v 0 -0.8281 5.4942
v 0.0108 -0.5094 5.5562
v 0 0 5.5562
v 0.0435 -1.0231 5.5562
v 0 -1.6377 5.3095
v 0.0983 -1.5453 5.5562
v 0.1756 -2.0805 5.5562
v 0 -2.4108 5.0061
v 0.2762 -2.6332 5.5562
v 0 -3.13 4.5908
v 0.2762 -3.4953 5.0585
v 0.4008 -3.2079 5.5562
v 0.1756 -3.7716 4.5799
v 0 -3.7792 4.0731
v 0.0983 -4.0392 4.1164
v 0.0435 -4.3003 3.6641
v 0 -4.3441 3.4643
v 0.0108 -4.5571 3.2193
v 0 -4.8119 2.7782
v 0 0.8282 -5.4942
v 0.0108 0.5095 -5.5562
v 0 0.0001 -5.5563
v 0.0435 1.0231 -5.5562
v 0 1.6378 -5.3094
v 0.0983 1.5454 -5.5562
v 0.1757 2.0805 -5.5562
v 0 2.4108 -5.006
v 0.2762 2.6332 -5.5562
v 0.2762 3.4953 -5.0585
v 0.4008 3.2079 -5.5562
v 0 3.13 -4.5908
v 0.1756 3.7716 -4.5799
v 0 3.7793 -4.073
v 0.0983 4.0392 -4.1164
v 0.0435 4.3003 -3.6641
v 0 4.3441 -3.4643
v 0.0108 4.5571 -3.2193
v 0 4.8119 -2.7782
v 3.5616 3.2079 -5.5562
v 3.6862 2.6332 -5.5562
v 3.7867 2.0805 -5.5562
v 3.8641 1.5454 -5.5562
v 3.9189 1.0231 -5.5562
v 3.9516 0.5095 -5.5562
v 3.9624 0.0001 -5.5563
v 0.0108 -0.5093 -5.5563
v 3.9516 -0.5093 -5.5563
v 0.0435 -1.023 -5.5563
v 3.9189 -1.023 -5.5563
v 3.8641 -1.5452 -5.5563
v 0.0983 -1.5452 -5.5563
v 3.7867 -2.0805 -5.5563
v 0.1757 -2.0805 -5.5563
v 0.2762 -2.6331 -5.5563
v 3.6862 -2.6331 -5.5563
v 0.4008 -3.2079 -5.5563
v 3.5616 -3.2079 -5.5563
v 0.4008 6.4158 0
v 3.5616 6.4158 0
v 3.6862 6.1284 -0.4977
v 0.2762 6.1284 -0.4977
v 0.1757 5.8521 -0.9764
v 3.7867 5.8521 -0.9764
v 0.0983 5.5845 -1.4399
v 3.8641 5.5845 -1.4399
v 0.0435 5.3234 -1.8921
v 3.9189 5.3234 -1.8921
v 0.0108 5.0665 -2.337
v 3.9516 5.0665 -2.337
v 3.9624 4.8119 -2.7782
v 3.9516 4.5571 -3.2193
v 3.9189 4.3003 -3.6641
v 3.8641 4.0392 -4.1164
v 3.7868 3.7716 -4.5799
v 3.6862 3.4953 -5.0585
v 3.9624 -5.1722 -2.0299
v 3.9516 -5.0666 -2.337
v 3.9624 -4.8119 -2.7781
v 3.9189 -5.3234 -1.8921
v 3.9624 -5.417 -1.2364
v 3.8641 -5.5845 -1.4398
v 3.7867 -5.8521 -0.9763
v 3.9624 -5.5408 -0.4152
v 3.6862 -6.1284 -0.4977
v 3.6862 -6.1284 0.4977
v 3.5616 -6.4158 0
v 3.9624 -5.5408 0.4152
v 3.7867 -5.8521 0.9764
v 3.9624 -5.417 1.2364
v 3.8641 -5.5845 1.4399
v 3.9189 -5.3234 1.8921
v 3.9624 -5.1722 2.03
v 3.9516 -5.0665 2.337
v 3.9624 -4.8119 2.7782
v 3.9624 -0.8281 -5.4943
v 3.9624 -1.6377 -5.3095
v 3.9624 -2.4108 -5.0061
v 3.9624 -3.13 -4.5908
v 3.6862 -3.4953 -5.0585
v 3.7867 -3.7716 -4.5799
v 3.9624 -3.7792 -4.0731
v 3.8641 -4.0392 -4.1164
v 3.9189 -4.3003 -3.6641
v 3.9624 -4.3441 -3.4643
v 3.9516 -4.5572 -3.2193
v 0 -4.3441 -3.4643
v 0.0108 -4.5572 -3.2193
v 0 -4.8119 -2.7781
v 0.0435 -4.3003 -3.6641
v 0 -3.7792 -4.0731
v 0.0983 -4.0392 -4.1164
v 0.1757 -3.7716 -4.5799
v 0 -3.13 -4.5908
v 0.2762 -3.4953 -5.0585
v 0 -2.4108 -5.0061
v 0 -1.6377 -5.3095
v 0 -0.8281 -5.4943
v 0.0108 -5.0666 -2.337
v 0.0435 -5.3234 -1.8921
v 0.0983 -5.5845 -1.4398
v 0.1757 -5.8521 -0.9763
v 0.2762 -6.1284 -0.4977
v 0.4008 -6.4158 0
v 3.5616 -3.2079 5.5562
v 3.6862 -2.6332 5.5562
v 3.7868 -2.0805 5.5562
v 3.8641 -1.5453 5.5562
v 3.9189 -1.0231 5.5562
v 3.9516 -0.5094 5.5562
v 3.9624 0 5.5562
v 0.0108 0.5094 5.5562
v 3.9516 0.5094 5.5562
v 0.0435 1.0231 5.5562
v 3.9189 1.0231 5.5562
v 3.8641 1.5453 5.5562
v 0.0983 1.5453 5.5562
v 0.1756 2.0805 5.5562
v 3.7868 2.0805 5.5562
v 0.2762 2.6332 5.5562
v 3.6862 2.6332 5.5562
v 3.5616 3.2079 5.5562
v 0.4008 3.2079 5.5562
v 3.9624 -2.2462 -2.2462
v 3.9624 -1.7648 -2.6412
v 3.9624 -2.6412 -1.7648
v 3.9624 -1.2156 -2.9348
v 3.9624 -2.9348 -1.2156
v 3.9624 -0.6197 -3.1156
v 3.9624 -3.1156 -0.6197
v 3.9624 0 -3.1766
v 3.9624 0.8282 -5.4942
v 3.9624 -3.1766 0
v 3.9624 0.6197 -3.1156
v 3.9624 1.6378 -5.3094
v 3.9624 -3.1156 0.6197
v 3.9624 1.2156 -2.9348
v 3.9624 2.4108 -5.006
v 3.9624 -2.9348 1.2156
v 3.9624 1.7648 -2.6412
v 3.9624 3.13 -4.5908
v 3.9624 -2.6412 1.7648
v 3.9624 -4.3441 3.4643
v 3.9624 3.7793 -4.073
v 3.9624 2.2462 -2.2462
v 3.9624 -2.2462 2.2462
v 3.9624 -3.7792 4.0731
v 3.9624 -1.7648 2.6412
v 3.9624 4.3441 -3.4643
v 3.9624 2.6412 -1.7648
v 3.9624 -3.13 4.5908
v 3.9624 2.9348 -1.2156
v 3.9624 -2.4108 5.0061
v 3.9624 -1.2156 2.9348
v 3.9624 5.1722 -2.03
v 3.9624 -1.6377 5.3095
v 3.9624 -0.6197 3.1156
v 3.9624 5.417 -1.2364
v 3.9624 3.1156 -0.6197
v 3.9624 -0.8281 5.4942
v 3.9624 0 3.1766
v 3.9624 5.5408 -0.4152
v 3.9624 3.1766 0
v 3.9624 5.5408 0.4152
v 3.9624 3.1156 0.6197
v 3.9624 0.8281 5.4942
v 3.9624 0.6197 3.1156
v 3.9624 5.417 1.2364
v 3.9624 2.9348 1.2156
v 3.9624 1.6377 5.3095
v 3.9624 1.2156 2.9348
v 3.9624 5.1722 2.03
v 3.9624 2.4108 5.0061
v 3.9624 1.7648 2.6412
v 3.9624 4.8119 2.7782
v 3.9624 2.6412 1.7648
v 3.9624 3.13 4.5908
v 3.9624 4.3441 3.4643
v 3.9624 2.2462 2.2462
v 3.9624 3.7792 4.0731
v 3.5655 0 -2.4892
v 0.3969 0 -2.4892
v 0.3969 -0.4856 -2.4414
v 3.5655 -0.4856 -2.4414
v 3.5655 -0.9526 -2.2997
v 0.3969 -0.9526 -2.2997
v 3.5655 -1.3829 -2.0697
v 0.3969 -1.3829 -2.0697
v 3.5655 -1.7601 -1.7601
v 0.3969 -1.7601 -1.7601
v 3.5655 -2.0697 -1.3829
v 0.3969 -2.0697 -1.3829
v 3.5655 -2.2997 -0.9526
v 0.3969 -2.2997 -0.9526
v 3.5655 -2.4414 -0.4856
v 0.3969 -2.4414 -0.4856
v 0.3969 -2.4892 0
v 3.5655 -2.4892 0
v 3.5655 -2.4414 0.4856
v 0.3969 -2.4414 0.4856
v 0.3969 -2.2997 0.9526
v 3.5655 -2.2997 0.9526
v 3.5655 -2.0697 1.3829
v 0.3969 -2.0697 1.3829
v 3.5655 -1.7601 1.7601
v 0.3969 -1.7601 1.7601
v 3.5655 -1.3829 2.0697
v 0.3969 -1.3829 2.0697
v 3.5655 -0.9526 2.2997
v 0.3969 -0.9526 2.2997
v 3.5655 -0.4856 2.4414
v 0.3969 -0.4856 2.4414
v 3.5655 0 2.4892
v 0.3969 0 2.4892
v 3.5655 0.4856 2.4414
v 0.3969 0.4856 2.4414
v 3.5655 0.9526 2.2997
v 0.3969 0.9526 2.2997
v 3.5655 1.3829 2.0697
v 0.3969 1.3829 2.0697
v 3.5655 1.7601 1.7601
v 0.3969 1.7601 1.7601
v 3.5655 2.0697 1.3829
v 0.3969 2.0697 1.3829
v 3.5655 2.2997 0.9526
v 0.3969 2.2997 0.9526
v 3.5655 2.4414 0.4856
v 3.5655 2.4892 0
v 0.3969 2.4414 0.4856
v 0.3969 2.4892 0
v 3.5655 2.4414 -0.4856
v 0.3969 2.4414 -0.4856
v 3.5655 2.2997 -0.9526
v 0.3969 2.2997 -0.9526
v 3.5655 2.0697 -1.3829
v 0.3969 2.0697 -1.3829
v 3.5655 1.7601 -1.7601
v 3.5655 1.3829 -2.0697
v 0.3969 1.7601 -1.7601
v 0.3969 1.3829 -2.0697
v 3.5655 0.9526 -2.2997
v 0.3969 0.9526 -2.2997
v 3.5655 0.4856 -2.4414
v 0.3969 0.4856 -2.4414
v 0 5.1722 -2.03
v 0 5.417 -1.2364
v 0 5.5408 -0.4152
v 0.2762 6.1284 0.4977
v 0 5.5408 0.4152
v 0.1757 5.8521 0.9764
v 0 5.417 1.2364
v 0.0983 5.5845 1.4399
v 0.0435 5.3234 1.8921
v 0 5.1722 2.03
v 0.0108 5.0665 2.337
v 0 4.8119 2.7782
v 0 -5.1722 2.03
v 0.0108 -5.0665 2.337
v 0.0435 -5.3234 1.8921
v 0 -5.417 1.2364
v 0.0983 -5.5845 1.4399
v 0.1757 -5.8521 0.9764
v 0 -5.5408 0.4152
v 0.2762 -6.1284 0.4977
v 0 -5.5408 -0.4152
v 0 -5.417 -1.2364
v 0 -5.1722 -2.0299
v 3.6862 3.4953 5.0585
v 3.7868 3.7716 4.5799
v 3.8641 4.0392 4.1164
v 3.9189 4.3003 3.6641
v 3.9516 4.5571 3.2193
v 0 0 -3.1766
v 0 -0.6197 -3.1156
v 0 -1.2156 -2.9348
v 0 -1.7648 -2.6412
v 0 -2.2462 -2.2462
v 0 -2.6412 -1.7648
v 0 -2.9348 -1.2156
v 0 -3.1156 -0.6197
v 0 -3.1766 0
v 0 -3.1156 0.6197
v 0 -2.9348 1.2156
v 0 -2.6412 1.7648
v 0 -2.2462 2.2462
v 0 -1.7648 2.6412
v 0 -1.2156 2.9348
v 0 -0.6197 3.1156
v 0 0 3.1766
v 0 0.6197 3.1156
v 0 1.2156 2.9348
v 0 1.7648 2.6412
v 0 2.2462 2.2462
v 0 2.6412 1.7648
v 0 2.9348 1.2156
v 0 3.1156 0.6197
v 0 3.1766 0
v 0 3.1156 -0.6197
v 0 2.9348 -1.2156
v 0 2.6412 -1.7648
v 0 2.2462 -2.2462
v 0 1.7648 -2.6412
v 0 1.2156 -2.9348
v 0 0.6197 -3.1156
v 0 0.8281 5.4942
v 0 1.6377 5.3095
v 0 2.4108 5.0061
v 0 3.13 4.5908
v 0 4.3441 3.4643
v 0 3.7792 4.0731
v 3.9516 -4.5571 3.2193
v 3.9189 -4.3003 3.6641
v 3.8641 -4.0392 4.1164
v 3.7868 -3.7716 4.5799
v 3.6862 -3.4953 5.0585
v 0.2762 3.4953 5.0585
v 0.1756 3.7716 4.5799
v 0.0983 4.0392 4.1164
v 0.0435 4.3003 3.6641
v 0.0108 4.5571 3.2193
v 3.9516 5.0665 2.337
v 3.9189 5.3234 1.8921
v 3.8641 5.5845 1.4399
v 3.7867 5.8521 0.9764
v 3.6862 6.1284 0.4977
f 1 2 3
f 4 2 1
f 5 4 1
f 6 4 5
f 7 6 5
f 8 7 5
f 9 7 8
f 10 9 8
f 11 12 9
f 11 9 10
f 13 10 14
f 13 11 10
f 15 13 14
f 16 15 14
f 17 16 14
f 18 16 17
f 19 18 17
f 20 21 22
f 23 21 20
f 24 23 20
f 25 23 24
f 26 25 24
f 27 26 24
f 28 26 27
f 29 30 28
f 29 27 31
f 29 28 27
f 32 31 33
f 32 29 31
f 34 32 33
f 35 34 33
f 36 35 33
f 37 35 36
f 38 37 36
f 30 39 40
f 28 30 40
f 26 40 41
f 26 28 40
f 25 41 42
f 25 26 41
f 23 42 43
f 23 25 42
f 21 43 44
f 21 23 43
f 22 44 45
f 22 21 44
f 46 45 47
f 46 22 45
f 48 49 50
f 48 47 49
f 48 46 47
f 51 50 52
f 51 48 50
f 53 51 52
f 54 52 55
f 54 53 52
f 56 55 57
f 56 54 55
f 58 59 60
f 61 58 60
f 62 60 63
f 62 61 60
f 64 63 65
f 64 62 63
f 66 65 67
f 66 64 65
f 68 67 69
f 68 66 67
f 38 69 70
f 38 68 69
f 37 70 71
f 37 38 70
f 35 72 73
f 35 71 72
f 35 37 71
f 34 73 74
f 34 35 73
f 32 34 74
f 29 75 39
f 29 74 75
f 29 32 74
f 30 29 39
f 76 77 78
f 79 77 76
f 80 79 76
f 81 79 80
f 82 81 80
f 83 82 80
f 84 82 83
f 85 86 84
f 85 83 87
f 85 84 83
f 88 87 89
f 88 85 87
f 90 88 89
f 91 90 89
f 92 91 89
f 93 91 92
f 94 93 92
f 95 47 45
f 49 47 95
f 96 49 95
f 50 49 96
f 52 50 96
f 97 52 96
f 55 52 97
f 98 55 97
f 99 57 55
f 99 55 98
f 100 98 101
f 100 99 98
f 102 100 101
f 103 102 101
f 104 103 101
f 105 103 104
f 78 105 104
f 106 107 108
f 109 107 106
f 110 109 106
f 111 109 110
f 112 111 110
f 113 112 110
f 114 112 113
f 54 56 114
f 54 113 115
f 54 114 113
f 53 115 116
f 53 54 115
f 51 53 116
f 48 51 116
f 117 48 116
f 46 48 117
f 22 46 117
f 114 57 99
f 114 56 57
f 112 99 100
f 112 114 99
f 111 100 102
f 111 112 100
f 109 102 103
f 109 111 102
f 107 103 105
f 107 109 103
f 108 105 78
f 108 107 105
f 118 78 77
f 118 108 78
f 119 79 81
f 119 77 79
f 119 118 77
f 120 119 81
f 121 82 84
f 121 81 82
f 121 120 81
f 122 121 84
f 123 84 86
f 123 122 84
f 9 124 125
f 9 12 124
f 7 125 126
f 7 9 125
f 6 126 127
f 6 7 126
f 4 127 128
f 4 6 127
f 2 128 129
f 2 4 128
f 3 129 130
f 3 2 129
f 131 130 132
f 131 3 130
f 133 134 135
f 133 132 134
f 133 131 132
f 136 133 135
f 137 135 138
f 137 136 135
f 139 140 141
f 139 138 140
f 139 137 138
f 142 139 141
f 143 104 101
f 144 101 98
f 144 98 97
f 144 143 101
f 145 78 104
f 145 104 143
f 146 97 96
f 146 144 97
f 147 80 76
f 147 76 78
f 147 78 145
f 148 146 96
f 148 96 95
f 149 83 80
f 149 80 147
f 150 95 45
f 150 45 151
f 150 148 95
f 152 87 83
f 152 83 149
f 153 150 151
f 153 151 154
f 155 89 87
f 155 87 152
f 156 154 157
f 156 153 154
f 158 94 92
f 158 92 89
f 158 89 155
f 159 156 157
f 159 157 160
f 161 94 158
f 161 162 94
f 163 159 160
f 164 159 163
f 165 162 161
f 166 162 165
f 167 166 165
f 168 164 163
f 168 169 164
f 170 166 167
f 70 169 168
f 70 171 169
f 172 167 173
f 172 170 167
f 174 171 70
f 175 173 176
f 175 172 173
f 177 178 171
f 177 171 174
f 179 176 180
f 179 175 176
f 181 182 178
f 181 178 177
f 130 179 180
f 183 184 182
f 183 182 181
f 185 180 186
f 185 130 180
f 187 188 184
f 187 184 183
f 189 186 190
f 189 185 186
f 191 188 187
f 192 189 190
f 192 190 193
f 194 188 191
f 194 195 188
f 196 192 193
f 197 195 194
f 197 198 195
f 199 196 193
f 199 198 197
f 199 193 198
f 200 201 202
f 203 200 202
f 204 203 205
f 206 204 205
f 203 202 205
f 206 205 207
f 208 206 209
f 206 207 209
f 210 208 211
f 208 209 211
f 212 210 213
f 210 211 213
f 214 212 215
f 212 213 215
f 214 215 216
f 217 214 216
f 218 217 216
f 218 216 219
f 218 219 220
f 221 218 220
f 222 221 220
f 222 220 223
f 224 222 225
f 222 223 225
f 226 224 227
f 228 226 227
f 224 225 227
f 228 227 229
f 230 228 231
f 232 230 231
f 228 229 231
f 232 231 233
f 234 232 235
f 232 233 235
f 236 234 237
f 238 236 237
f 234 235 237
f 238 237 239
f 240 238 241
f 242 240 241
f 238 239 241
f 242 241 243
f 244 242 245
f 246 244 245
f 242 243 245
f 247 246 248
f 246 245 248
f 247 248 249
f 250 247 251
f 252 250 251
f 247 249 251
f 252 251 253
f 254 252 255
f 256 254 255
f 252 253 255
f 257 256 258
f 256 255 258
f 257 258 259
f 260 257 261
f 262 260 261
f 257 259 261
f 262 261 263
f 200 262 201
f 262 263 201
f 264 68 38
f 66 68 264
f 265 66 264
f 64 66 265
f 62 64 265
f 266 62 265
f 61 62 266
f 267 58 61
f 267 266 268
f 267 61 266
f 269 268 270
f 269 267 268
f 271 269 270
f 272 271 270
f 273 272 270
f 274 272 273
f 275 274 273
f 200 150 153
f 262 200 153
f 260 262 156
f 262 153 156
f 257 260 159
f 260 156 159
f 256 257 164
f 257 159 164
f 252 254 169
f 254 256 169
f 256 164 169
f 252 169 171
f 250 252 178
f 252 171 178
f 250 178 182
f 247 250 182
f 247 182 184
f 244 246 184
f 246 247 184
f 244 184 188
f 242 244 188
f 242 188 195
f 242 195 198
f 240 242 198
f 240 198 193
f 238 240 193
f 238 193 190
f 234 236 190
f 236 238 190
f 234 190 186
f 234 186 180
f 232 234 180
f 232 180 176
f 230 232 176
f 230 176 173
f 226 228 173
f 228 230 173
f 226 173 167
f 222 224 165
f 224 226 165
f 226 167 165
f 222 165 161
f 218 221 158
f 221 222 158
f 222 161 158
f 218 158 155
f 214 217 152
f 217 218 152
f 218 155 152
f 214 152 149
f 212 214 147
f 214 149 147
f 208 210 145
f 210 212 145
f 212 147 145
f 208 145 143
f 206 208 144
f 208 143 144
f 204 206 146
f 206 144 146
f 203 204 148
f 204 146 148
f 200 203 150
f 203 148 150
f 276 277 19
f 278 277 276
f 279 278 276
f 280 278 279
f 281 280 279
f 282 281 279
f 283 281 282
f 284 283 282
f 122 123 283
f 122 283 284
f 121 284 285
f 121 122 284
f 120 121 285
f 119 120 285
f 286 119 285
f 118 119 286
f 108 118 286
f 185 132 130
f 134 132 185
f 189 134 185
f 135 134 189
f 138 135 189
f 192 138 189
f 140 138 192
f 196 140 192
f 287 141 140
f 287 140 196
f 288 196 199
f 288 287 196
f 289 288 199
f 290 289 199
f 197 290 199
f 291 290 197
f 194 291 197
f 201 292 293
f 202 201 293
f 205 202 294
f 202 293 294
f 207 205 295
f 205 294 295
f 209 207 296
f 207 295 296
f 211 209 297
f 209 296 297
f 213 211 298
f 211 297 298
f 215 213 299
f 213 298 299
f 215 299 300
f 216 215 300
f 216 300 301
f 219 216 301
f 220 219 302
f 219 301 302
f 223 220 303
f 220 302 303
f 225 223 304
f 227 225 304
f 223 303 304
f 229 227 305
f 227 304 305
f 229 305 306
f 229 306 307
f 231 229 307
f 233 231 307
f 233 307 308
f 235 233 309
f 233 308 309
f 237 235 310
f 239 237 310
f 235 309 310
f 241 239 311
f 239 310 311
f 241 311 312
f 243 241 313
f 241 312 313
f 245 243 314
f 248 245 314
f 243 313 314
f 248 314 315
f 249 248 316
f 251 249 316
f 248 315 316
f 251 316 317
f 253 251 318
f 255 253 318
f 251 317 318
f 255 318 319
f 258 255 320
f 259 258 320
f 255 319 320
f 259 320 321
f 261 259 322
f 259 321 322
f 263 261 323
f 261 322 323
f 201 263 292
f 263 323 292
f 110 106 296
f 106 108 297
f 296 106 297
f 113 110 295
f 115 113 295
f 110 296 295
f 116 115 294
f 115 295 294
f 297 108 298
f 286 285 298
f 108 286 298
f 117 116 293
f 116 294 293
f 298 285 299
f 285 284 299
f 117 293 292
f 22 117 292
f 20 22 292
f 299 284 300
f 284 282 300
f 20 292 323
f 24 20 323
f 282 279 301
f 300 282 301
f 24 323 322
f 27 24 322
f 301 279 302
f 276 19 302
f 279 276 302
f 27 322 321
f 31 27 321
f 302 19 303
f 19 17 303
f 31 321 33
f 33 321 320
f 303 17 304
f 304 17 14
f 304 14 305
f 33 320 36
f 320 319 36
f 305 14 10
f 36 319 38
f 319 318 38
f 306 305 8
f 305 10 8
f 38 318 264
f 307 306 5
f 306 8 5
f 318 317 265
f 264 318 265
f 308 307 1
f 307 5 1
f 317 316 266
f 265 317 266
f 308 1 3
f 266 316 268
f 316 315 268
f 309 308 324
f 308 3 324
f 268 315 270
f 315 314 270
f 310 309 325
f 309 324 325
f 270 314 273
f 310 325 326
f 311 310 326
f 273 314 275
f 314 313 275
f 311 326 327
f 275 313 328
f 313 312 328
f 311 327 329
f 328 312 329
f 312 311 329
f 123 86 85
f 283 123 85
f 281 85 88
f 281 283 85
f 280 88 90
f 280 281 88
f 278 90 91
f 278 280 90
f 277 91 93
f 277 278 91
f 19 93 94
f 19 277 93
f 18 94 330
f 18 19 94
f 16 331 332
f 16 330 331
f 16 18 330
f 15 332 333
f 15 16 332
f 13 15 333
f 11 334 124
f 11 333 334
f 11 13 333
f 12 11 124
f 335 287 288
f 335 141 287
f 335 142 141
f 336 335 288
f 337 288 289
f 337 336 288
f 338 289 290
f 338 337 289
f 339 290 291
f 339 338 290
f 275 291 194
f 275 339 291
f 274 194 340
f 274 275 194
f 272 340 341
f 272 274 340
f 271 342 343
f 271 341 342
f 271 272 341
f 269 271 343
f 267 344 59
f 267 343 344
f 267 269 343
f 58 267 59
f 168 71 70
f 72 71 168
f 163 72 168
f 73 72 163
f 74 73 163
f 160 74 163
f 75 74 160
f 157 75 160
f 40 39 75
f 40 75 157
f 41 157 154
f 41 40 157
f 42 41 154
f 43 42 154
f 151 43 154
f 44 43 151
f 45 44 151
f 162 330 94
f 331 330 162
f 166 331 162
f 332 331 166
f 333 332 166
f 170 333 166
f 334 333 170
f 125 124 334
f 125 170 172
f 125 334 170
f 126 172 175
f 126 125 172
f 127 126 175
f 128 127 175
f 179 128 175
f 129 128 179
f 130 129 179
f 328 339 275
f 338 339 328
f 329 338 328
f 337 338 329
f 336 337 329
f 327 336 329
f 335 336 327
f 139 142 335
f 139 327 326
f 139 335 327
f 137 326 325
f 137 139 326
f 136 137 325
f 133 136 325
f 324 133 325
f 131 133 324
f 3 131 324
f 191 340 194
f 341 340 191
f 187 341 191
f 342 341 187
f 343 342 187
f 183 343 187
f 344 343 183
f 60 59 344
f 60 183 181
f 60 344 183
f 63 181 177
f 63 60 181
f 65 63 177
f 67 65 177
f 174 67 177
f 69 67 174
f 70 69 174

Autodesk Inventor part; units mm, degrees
ref_plane "YZ Plane" through (0, 0, 0) normal (1, 0, 0) x (0, 1, 0)
ref_plane "XZ Plane" through (0, 0, 0) normal (0, 1, 0) x (-1, 0, 0)
sketch "Sketch1" plane through (0, 0, 0) normal (1, 0, 0) x (0, 1, 0)
  line L0 (-6.4158, 0) -> (-3.2079, 5.5562)
  line L1 (-3.2079, 5.5562) -> (3.2079, 5.5562)
  line L2 (3.2079, 5.5562) -> (6.4158, 0)
  line L3 (6.4158, 0) -> (3.2079, -5.5562)
  line L4 (3.2079, -5.5562) -> (-3.2079, -5.5563)
  line L5 (-3.2079, -5.5563) -> (-6.4158, 0)
  point P0 (0, 0)
  point P1 (0, 0)
  dimension "d0" = 12.8316
extrude "Body" add sketch "Sketch1" along normal blind 3.9624
sketch "Sketch2" plane through (0, 0, 0) normal (0, 0, 1) x (1, 0, 0)
  line L0 (0, 3.2079) -> (0, 6.4158) projected
  line L1 (0, 6.4158) -> (3.9624, 6.4158) projected
  line L2 (3.9624, 3.2079) -> (3.9624, 6.4158) projected
  line L3 (-0.7925, 0) -> (4.7549, 0) projected
  line L4 (0.4008, 6.4158) -> (0, 5.5563)
  line L5 (3.5616, 6.4158) -> (3.9624, 5.5563)
  dimension "d3" = 25
  dimension "d4" = 25
  dimension "d5" = 11.1125
  dimension "d6" = 11.1125
revolve "Chamfer1" cut sketch "Sketch2" angle 360 about axis through (-10, 0, 0) along (1, 0, 0)
sketch "Sketch3" plane through (3.9624, 0, 0) normal (1, 0, 0) x (0, 0, -1)
  arc A0 (-2.7781, -4.8119) -> (2.7781, -4.8119) centre (0, 0) ccw projected
hole "Thread" at (3.9624, 0, 0) direction (-1, 0, 0) diameter 4.9784 end through all thread size "1/4-20 UNC" class "2B" standard "ANSI Unified Screw Threads"
chamfer "Chamfer2" distance 0.6874 angle 30 1 edges at (3.9624, 0, 2.4892) measured on face at (3.9624, 4.5076, -0.1)
chamfer "Chamfer3" distance 0.6874 angle 30 1 edges at (0, 0, 2.4892) measured on face at (0, 4.5076, -0.1)
ref_plane "Work Plane1" through (-13.4686, 0, 0) normal (0, -0.8660254, -0.5) x (1, 0, 0)
equation "\"d0\" = 1.1547 * SW"
equation "\"d1\" = KOH"
equation "\"d3\" = ANG1"
equation "\"d4\" = ANG2"
equation "\"d5\" = SW0"
equation "\"d6\" = SW01"
equation "\"d8\" = -0.5 * GD1 + 0.5 * NND"
equation "\"d40\" = -0.5 * GD1 + 0.5 * NND"
equation "\"d10\" = -0.5 * GD1 + 0.5 * NND"
equation "\"d41\" = -0.5 * GD1 + 0.5 * NND"
equation "\"ANG1\" = 25deg"
equation "\"ANG2\" = 25deg"
equation "\"NND\" = 6.35"
equation "\"KOH\" = 3.9624"
equation "\"SW\" = 11.1125"
equation "\"SW0\" = SW"
equation "\"SW01\" = SW"
equation "\"THREADDIA\" = 6.35"
equation "\"TOA\" = 30deg"
equation "\"E0\" = 1.155 * SW"
equation "\"GD1\" = 4.975185"
properties part number "ANSI B18.2.2 - 1/4 - 20"
